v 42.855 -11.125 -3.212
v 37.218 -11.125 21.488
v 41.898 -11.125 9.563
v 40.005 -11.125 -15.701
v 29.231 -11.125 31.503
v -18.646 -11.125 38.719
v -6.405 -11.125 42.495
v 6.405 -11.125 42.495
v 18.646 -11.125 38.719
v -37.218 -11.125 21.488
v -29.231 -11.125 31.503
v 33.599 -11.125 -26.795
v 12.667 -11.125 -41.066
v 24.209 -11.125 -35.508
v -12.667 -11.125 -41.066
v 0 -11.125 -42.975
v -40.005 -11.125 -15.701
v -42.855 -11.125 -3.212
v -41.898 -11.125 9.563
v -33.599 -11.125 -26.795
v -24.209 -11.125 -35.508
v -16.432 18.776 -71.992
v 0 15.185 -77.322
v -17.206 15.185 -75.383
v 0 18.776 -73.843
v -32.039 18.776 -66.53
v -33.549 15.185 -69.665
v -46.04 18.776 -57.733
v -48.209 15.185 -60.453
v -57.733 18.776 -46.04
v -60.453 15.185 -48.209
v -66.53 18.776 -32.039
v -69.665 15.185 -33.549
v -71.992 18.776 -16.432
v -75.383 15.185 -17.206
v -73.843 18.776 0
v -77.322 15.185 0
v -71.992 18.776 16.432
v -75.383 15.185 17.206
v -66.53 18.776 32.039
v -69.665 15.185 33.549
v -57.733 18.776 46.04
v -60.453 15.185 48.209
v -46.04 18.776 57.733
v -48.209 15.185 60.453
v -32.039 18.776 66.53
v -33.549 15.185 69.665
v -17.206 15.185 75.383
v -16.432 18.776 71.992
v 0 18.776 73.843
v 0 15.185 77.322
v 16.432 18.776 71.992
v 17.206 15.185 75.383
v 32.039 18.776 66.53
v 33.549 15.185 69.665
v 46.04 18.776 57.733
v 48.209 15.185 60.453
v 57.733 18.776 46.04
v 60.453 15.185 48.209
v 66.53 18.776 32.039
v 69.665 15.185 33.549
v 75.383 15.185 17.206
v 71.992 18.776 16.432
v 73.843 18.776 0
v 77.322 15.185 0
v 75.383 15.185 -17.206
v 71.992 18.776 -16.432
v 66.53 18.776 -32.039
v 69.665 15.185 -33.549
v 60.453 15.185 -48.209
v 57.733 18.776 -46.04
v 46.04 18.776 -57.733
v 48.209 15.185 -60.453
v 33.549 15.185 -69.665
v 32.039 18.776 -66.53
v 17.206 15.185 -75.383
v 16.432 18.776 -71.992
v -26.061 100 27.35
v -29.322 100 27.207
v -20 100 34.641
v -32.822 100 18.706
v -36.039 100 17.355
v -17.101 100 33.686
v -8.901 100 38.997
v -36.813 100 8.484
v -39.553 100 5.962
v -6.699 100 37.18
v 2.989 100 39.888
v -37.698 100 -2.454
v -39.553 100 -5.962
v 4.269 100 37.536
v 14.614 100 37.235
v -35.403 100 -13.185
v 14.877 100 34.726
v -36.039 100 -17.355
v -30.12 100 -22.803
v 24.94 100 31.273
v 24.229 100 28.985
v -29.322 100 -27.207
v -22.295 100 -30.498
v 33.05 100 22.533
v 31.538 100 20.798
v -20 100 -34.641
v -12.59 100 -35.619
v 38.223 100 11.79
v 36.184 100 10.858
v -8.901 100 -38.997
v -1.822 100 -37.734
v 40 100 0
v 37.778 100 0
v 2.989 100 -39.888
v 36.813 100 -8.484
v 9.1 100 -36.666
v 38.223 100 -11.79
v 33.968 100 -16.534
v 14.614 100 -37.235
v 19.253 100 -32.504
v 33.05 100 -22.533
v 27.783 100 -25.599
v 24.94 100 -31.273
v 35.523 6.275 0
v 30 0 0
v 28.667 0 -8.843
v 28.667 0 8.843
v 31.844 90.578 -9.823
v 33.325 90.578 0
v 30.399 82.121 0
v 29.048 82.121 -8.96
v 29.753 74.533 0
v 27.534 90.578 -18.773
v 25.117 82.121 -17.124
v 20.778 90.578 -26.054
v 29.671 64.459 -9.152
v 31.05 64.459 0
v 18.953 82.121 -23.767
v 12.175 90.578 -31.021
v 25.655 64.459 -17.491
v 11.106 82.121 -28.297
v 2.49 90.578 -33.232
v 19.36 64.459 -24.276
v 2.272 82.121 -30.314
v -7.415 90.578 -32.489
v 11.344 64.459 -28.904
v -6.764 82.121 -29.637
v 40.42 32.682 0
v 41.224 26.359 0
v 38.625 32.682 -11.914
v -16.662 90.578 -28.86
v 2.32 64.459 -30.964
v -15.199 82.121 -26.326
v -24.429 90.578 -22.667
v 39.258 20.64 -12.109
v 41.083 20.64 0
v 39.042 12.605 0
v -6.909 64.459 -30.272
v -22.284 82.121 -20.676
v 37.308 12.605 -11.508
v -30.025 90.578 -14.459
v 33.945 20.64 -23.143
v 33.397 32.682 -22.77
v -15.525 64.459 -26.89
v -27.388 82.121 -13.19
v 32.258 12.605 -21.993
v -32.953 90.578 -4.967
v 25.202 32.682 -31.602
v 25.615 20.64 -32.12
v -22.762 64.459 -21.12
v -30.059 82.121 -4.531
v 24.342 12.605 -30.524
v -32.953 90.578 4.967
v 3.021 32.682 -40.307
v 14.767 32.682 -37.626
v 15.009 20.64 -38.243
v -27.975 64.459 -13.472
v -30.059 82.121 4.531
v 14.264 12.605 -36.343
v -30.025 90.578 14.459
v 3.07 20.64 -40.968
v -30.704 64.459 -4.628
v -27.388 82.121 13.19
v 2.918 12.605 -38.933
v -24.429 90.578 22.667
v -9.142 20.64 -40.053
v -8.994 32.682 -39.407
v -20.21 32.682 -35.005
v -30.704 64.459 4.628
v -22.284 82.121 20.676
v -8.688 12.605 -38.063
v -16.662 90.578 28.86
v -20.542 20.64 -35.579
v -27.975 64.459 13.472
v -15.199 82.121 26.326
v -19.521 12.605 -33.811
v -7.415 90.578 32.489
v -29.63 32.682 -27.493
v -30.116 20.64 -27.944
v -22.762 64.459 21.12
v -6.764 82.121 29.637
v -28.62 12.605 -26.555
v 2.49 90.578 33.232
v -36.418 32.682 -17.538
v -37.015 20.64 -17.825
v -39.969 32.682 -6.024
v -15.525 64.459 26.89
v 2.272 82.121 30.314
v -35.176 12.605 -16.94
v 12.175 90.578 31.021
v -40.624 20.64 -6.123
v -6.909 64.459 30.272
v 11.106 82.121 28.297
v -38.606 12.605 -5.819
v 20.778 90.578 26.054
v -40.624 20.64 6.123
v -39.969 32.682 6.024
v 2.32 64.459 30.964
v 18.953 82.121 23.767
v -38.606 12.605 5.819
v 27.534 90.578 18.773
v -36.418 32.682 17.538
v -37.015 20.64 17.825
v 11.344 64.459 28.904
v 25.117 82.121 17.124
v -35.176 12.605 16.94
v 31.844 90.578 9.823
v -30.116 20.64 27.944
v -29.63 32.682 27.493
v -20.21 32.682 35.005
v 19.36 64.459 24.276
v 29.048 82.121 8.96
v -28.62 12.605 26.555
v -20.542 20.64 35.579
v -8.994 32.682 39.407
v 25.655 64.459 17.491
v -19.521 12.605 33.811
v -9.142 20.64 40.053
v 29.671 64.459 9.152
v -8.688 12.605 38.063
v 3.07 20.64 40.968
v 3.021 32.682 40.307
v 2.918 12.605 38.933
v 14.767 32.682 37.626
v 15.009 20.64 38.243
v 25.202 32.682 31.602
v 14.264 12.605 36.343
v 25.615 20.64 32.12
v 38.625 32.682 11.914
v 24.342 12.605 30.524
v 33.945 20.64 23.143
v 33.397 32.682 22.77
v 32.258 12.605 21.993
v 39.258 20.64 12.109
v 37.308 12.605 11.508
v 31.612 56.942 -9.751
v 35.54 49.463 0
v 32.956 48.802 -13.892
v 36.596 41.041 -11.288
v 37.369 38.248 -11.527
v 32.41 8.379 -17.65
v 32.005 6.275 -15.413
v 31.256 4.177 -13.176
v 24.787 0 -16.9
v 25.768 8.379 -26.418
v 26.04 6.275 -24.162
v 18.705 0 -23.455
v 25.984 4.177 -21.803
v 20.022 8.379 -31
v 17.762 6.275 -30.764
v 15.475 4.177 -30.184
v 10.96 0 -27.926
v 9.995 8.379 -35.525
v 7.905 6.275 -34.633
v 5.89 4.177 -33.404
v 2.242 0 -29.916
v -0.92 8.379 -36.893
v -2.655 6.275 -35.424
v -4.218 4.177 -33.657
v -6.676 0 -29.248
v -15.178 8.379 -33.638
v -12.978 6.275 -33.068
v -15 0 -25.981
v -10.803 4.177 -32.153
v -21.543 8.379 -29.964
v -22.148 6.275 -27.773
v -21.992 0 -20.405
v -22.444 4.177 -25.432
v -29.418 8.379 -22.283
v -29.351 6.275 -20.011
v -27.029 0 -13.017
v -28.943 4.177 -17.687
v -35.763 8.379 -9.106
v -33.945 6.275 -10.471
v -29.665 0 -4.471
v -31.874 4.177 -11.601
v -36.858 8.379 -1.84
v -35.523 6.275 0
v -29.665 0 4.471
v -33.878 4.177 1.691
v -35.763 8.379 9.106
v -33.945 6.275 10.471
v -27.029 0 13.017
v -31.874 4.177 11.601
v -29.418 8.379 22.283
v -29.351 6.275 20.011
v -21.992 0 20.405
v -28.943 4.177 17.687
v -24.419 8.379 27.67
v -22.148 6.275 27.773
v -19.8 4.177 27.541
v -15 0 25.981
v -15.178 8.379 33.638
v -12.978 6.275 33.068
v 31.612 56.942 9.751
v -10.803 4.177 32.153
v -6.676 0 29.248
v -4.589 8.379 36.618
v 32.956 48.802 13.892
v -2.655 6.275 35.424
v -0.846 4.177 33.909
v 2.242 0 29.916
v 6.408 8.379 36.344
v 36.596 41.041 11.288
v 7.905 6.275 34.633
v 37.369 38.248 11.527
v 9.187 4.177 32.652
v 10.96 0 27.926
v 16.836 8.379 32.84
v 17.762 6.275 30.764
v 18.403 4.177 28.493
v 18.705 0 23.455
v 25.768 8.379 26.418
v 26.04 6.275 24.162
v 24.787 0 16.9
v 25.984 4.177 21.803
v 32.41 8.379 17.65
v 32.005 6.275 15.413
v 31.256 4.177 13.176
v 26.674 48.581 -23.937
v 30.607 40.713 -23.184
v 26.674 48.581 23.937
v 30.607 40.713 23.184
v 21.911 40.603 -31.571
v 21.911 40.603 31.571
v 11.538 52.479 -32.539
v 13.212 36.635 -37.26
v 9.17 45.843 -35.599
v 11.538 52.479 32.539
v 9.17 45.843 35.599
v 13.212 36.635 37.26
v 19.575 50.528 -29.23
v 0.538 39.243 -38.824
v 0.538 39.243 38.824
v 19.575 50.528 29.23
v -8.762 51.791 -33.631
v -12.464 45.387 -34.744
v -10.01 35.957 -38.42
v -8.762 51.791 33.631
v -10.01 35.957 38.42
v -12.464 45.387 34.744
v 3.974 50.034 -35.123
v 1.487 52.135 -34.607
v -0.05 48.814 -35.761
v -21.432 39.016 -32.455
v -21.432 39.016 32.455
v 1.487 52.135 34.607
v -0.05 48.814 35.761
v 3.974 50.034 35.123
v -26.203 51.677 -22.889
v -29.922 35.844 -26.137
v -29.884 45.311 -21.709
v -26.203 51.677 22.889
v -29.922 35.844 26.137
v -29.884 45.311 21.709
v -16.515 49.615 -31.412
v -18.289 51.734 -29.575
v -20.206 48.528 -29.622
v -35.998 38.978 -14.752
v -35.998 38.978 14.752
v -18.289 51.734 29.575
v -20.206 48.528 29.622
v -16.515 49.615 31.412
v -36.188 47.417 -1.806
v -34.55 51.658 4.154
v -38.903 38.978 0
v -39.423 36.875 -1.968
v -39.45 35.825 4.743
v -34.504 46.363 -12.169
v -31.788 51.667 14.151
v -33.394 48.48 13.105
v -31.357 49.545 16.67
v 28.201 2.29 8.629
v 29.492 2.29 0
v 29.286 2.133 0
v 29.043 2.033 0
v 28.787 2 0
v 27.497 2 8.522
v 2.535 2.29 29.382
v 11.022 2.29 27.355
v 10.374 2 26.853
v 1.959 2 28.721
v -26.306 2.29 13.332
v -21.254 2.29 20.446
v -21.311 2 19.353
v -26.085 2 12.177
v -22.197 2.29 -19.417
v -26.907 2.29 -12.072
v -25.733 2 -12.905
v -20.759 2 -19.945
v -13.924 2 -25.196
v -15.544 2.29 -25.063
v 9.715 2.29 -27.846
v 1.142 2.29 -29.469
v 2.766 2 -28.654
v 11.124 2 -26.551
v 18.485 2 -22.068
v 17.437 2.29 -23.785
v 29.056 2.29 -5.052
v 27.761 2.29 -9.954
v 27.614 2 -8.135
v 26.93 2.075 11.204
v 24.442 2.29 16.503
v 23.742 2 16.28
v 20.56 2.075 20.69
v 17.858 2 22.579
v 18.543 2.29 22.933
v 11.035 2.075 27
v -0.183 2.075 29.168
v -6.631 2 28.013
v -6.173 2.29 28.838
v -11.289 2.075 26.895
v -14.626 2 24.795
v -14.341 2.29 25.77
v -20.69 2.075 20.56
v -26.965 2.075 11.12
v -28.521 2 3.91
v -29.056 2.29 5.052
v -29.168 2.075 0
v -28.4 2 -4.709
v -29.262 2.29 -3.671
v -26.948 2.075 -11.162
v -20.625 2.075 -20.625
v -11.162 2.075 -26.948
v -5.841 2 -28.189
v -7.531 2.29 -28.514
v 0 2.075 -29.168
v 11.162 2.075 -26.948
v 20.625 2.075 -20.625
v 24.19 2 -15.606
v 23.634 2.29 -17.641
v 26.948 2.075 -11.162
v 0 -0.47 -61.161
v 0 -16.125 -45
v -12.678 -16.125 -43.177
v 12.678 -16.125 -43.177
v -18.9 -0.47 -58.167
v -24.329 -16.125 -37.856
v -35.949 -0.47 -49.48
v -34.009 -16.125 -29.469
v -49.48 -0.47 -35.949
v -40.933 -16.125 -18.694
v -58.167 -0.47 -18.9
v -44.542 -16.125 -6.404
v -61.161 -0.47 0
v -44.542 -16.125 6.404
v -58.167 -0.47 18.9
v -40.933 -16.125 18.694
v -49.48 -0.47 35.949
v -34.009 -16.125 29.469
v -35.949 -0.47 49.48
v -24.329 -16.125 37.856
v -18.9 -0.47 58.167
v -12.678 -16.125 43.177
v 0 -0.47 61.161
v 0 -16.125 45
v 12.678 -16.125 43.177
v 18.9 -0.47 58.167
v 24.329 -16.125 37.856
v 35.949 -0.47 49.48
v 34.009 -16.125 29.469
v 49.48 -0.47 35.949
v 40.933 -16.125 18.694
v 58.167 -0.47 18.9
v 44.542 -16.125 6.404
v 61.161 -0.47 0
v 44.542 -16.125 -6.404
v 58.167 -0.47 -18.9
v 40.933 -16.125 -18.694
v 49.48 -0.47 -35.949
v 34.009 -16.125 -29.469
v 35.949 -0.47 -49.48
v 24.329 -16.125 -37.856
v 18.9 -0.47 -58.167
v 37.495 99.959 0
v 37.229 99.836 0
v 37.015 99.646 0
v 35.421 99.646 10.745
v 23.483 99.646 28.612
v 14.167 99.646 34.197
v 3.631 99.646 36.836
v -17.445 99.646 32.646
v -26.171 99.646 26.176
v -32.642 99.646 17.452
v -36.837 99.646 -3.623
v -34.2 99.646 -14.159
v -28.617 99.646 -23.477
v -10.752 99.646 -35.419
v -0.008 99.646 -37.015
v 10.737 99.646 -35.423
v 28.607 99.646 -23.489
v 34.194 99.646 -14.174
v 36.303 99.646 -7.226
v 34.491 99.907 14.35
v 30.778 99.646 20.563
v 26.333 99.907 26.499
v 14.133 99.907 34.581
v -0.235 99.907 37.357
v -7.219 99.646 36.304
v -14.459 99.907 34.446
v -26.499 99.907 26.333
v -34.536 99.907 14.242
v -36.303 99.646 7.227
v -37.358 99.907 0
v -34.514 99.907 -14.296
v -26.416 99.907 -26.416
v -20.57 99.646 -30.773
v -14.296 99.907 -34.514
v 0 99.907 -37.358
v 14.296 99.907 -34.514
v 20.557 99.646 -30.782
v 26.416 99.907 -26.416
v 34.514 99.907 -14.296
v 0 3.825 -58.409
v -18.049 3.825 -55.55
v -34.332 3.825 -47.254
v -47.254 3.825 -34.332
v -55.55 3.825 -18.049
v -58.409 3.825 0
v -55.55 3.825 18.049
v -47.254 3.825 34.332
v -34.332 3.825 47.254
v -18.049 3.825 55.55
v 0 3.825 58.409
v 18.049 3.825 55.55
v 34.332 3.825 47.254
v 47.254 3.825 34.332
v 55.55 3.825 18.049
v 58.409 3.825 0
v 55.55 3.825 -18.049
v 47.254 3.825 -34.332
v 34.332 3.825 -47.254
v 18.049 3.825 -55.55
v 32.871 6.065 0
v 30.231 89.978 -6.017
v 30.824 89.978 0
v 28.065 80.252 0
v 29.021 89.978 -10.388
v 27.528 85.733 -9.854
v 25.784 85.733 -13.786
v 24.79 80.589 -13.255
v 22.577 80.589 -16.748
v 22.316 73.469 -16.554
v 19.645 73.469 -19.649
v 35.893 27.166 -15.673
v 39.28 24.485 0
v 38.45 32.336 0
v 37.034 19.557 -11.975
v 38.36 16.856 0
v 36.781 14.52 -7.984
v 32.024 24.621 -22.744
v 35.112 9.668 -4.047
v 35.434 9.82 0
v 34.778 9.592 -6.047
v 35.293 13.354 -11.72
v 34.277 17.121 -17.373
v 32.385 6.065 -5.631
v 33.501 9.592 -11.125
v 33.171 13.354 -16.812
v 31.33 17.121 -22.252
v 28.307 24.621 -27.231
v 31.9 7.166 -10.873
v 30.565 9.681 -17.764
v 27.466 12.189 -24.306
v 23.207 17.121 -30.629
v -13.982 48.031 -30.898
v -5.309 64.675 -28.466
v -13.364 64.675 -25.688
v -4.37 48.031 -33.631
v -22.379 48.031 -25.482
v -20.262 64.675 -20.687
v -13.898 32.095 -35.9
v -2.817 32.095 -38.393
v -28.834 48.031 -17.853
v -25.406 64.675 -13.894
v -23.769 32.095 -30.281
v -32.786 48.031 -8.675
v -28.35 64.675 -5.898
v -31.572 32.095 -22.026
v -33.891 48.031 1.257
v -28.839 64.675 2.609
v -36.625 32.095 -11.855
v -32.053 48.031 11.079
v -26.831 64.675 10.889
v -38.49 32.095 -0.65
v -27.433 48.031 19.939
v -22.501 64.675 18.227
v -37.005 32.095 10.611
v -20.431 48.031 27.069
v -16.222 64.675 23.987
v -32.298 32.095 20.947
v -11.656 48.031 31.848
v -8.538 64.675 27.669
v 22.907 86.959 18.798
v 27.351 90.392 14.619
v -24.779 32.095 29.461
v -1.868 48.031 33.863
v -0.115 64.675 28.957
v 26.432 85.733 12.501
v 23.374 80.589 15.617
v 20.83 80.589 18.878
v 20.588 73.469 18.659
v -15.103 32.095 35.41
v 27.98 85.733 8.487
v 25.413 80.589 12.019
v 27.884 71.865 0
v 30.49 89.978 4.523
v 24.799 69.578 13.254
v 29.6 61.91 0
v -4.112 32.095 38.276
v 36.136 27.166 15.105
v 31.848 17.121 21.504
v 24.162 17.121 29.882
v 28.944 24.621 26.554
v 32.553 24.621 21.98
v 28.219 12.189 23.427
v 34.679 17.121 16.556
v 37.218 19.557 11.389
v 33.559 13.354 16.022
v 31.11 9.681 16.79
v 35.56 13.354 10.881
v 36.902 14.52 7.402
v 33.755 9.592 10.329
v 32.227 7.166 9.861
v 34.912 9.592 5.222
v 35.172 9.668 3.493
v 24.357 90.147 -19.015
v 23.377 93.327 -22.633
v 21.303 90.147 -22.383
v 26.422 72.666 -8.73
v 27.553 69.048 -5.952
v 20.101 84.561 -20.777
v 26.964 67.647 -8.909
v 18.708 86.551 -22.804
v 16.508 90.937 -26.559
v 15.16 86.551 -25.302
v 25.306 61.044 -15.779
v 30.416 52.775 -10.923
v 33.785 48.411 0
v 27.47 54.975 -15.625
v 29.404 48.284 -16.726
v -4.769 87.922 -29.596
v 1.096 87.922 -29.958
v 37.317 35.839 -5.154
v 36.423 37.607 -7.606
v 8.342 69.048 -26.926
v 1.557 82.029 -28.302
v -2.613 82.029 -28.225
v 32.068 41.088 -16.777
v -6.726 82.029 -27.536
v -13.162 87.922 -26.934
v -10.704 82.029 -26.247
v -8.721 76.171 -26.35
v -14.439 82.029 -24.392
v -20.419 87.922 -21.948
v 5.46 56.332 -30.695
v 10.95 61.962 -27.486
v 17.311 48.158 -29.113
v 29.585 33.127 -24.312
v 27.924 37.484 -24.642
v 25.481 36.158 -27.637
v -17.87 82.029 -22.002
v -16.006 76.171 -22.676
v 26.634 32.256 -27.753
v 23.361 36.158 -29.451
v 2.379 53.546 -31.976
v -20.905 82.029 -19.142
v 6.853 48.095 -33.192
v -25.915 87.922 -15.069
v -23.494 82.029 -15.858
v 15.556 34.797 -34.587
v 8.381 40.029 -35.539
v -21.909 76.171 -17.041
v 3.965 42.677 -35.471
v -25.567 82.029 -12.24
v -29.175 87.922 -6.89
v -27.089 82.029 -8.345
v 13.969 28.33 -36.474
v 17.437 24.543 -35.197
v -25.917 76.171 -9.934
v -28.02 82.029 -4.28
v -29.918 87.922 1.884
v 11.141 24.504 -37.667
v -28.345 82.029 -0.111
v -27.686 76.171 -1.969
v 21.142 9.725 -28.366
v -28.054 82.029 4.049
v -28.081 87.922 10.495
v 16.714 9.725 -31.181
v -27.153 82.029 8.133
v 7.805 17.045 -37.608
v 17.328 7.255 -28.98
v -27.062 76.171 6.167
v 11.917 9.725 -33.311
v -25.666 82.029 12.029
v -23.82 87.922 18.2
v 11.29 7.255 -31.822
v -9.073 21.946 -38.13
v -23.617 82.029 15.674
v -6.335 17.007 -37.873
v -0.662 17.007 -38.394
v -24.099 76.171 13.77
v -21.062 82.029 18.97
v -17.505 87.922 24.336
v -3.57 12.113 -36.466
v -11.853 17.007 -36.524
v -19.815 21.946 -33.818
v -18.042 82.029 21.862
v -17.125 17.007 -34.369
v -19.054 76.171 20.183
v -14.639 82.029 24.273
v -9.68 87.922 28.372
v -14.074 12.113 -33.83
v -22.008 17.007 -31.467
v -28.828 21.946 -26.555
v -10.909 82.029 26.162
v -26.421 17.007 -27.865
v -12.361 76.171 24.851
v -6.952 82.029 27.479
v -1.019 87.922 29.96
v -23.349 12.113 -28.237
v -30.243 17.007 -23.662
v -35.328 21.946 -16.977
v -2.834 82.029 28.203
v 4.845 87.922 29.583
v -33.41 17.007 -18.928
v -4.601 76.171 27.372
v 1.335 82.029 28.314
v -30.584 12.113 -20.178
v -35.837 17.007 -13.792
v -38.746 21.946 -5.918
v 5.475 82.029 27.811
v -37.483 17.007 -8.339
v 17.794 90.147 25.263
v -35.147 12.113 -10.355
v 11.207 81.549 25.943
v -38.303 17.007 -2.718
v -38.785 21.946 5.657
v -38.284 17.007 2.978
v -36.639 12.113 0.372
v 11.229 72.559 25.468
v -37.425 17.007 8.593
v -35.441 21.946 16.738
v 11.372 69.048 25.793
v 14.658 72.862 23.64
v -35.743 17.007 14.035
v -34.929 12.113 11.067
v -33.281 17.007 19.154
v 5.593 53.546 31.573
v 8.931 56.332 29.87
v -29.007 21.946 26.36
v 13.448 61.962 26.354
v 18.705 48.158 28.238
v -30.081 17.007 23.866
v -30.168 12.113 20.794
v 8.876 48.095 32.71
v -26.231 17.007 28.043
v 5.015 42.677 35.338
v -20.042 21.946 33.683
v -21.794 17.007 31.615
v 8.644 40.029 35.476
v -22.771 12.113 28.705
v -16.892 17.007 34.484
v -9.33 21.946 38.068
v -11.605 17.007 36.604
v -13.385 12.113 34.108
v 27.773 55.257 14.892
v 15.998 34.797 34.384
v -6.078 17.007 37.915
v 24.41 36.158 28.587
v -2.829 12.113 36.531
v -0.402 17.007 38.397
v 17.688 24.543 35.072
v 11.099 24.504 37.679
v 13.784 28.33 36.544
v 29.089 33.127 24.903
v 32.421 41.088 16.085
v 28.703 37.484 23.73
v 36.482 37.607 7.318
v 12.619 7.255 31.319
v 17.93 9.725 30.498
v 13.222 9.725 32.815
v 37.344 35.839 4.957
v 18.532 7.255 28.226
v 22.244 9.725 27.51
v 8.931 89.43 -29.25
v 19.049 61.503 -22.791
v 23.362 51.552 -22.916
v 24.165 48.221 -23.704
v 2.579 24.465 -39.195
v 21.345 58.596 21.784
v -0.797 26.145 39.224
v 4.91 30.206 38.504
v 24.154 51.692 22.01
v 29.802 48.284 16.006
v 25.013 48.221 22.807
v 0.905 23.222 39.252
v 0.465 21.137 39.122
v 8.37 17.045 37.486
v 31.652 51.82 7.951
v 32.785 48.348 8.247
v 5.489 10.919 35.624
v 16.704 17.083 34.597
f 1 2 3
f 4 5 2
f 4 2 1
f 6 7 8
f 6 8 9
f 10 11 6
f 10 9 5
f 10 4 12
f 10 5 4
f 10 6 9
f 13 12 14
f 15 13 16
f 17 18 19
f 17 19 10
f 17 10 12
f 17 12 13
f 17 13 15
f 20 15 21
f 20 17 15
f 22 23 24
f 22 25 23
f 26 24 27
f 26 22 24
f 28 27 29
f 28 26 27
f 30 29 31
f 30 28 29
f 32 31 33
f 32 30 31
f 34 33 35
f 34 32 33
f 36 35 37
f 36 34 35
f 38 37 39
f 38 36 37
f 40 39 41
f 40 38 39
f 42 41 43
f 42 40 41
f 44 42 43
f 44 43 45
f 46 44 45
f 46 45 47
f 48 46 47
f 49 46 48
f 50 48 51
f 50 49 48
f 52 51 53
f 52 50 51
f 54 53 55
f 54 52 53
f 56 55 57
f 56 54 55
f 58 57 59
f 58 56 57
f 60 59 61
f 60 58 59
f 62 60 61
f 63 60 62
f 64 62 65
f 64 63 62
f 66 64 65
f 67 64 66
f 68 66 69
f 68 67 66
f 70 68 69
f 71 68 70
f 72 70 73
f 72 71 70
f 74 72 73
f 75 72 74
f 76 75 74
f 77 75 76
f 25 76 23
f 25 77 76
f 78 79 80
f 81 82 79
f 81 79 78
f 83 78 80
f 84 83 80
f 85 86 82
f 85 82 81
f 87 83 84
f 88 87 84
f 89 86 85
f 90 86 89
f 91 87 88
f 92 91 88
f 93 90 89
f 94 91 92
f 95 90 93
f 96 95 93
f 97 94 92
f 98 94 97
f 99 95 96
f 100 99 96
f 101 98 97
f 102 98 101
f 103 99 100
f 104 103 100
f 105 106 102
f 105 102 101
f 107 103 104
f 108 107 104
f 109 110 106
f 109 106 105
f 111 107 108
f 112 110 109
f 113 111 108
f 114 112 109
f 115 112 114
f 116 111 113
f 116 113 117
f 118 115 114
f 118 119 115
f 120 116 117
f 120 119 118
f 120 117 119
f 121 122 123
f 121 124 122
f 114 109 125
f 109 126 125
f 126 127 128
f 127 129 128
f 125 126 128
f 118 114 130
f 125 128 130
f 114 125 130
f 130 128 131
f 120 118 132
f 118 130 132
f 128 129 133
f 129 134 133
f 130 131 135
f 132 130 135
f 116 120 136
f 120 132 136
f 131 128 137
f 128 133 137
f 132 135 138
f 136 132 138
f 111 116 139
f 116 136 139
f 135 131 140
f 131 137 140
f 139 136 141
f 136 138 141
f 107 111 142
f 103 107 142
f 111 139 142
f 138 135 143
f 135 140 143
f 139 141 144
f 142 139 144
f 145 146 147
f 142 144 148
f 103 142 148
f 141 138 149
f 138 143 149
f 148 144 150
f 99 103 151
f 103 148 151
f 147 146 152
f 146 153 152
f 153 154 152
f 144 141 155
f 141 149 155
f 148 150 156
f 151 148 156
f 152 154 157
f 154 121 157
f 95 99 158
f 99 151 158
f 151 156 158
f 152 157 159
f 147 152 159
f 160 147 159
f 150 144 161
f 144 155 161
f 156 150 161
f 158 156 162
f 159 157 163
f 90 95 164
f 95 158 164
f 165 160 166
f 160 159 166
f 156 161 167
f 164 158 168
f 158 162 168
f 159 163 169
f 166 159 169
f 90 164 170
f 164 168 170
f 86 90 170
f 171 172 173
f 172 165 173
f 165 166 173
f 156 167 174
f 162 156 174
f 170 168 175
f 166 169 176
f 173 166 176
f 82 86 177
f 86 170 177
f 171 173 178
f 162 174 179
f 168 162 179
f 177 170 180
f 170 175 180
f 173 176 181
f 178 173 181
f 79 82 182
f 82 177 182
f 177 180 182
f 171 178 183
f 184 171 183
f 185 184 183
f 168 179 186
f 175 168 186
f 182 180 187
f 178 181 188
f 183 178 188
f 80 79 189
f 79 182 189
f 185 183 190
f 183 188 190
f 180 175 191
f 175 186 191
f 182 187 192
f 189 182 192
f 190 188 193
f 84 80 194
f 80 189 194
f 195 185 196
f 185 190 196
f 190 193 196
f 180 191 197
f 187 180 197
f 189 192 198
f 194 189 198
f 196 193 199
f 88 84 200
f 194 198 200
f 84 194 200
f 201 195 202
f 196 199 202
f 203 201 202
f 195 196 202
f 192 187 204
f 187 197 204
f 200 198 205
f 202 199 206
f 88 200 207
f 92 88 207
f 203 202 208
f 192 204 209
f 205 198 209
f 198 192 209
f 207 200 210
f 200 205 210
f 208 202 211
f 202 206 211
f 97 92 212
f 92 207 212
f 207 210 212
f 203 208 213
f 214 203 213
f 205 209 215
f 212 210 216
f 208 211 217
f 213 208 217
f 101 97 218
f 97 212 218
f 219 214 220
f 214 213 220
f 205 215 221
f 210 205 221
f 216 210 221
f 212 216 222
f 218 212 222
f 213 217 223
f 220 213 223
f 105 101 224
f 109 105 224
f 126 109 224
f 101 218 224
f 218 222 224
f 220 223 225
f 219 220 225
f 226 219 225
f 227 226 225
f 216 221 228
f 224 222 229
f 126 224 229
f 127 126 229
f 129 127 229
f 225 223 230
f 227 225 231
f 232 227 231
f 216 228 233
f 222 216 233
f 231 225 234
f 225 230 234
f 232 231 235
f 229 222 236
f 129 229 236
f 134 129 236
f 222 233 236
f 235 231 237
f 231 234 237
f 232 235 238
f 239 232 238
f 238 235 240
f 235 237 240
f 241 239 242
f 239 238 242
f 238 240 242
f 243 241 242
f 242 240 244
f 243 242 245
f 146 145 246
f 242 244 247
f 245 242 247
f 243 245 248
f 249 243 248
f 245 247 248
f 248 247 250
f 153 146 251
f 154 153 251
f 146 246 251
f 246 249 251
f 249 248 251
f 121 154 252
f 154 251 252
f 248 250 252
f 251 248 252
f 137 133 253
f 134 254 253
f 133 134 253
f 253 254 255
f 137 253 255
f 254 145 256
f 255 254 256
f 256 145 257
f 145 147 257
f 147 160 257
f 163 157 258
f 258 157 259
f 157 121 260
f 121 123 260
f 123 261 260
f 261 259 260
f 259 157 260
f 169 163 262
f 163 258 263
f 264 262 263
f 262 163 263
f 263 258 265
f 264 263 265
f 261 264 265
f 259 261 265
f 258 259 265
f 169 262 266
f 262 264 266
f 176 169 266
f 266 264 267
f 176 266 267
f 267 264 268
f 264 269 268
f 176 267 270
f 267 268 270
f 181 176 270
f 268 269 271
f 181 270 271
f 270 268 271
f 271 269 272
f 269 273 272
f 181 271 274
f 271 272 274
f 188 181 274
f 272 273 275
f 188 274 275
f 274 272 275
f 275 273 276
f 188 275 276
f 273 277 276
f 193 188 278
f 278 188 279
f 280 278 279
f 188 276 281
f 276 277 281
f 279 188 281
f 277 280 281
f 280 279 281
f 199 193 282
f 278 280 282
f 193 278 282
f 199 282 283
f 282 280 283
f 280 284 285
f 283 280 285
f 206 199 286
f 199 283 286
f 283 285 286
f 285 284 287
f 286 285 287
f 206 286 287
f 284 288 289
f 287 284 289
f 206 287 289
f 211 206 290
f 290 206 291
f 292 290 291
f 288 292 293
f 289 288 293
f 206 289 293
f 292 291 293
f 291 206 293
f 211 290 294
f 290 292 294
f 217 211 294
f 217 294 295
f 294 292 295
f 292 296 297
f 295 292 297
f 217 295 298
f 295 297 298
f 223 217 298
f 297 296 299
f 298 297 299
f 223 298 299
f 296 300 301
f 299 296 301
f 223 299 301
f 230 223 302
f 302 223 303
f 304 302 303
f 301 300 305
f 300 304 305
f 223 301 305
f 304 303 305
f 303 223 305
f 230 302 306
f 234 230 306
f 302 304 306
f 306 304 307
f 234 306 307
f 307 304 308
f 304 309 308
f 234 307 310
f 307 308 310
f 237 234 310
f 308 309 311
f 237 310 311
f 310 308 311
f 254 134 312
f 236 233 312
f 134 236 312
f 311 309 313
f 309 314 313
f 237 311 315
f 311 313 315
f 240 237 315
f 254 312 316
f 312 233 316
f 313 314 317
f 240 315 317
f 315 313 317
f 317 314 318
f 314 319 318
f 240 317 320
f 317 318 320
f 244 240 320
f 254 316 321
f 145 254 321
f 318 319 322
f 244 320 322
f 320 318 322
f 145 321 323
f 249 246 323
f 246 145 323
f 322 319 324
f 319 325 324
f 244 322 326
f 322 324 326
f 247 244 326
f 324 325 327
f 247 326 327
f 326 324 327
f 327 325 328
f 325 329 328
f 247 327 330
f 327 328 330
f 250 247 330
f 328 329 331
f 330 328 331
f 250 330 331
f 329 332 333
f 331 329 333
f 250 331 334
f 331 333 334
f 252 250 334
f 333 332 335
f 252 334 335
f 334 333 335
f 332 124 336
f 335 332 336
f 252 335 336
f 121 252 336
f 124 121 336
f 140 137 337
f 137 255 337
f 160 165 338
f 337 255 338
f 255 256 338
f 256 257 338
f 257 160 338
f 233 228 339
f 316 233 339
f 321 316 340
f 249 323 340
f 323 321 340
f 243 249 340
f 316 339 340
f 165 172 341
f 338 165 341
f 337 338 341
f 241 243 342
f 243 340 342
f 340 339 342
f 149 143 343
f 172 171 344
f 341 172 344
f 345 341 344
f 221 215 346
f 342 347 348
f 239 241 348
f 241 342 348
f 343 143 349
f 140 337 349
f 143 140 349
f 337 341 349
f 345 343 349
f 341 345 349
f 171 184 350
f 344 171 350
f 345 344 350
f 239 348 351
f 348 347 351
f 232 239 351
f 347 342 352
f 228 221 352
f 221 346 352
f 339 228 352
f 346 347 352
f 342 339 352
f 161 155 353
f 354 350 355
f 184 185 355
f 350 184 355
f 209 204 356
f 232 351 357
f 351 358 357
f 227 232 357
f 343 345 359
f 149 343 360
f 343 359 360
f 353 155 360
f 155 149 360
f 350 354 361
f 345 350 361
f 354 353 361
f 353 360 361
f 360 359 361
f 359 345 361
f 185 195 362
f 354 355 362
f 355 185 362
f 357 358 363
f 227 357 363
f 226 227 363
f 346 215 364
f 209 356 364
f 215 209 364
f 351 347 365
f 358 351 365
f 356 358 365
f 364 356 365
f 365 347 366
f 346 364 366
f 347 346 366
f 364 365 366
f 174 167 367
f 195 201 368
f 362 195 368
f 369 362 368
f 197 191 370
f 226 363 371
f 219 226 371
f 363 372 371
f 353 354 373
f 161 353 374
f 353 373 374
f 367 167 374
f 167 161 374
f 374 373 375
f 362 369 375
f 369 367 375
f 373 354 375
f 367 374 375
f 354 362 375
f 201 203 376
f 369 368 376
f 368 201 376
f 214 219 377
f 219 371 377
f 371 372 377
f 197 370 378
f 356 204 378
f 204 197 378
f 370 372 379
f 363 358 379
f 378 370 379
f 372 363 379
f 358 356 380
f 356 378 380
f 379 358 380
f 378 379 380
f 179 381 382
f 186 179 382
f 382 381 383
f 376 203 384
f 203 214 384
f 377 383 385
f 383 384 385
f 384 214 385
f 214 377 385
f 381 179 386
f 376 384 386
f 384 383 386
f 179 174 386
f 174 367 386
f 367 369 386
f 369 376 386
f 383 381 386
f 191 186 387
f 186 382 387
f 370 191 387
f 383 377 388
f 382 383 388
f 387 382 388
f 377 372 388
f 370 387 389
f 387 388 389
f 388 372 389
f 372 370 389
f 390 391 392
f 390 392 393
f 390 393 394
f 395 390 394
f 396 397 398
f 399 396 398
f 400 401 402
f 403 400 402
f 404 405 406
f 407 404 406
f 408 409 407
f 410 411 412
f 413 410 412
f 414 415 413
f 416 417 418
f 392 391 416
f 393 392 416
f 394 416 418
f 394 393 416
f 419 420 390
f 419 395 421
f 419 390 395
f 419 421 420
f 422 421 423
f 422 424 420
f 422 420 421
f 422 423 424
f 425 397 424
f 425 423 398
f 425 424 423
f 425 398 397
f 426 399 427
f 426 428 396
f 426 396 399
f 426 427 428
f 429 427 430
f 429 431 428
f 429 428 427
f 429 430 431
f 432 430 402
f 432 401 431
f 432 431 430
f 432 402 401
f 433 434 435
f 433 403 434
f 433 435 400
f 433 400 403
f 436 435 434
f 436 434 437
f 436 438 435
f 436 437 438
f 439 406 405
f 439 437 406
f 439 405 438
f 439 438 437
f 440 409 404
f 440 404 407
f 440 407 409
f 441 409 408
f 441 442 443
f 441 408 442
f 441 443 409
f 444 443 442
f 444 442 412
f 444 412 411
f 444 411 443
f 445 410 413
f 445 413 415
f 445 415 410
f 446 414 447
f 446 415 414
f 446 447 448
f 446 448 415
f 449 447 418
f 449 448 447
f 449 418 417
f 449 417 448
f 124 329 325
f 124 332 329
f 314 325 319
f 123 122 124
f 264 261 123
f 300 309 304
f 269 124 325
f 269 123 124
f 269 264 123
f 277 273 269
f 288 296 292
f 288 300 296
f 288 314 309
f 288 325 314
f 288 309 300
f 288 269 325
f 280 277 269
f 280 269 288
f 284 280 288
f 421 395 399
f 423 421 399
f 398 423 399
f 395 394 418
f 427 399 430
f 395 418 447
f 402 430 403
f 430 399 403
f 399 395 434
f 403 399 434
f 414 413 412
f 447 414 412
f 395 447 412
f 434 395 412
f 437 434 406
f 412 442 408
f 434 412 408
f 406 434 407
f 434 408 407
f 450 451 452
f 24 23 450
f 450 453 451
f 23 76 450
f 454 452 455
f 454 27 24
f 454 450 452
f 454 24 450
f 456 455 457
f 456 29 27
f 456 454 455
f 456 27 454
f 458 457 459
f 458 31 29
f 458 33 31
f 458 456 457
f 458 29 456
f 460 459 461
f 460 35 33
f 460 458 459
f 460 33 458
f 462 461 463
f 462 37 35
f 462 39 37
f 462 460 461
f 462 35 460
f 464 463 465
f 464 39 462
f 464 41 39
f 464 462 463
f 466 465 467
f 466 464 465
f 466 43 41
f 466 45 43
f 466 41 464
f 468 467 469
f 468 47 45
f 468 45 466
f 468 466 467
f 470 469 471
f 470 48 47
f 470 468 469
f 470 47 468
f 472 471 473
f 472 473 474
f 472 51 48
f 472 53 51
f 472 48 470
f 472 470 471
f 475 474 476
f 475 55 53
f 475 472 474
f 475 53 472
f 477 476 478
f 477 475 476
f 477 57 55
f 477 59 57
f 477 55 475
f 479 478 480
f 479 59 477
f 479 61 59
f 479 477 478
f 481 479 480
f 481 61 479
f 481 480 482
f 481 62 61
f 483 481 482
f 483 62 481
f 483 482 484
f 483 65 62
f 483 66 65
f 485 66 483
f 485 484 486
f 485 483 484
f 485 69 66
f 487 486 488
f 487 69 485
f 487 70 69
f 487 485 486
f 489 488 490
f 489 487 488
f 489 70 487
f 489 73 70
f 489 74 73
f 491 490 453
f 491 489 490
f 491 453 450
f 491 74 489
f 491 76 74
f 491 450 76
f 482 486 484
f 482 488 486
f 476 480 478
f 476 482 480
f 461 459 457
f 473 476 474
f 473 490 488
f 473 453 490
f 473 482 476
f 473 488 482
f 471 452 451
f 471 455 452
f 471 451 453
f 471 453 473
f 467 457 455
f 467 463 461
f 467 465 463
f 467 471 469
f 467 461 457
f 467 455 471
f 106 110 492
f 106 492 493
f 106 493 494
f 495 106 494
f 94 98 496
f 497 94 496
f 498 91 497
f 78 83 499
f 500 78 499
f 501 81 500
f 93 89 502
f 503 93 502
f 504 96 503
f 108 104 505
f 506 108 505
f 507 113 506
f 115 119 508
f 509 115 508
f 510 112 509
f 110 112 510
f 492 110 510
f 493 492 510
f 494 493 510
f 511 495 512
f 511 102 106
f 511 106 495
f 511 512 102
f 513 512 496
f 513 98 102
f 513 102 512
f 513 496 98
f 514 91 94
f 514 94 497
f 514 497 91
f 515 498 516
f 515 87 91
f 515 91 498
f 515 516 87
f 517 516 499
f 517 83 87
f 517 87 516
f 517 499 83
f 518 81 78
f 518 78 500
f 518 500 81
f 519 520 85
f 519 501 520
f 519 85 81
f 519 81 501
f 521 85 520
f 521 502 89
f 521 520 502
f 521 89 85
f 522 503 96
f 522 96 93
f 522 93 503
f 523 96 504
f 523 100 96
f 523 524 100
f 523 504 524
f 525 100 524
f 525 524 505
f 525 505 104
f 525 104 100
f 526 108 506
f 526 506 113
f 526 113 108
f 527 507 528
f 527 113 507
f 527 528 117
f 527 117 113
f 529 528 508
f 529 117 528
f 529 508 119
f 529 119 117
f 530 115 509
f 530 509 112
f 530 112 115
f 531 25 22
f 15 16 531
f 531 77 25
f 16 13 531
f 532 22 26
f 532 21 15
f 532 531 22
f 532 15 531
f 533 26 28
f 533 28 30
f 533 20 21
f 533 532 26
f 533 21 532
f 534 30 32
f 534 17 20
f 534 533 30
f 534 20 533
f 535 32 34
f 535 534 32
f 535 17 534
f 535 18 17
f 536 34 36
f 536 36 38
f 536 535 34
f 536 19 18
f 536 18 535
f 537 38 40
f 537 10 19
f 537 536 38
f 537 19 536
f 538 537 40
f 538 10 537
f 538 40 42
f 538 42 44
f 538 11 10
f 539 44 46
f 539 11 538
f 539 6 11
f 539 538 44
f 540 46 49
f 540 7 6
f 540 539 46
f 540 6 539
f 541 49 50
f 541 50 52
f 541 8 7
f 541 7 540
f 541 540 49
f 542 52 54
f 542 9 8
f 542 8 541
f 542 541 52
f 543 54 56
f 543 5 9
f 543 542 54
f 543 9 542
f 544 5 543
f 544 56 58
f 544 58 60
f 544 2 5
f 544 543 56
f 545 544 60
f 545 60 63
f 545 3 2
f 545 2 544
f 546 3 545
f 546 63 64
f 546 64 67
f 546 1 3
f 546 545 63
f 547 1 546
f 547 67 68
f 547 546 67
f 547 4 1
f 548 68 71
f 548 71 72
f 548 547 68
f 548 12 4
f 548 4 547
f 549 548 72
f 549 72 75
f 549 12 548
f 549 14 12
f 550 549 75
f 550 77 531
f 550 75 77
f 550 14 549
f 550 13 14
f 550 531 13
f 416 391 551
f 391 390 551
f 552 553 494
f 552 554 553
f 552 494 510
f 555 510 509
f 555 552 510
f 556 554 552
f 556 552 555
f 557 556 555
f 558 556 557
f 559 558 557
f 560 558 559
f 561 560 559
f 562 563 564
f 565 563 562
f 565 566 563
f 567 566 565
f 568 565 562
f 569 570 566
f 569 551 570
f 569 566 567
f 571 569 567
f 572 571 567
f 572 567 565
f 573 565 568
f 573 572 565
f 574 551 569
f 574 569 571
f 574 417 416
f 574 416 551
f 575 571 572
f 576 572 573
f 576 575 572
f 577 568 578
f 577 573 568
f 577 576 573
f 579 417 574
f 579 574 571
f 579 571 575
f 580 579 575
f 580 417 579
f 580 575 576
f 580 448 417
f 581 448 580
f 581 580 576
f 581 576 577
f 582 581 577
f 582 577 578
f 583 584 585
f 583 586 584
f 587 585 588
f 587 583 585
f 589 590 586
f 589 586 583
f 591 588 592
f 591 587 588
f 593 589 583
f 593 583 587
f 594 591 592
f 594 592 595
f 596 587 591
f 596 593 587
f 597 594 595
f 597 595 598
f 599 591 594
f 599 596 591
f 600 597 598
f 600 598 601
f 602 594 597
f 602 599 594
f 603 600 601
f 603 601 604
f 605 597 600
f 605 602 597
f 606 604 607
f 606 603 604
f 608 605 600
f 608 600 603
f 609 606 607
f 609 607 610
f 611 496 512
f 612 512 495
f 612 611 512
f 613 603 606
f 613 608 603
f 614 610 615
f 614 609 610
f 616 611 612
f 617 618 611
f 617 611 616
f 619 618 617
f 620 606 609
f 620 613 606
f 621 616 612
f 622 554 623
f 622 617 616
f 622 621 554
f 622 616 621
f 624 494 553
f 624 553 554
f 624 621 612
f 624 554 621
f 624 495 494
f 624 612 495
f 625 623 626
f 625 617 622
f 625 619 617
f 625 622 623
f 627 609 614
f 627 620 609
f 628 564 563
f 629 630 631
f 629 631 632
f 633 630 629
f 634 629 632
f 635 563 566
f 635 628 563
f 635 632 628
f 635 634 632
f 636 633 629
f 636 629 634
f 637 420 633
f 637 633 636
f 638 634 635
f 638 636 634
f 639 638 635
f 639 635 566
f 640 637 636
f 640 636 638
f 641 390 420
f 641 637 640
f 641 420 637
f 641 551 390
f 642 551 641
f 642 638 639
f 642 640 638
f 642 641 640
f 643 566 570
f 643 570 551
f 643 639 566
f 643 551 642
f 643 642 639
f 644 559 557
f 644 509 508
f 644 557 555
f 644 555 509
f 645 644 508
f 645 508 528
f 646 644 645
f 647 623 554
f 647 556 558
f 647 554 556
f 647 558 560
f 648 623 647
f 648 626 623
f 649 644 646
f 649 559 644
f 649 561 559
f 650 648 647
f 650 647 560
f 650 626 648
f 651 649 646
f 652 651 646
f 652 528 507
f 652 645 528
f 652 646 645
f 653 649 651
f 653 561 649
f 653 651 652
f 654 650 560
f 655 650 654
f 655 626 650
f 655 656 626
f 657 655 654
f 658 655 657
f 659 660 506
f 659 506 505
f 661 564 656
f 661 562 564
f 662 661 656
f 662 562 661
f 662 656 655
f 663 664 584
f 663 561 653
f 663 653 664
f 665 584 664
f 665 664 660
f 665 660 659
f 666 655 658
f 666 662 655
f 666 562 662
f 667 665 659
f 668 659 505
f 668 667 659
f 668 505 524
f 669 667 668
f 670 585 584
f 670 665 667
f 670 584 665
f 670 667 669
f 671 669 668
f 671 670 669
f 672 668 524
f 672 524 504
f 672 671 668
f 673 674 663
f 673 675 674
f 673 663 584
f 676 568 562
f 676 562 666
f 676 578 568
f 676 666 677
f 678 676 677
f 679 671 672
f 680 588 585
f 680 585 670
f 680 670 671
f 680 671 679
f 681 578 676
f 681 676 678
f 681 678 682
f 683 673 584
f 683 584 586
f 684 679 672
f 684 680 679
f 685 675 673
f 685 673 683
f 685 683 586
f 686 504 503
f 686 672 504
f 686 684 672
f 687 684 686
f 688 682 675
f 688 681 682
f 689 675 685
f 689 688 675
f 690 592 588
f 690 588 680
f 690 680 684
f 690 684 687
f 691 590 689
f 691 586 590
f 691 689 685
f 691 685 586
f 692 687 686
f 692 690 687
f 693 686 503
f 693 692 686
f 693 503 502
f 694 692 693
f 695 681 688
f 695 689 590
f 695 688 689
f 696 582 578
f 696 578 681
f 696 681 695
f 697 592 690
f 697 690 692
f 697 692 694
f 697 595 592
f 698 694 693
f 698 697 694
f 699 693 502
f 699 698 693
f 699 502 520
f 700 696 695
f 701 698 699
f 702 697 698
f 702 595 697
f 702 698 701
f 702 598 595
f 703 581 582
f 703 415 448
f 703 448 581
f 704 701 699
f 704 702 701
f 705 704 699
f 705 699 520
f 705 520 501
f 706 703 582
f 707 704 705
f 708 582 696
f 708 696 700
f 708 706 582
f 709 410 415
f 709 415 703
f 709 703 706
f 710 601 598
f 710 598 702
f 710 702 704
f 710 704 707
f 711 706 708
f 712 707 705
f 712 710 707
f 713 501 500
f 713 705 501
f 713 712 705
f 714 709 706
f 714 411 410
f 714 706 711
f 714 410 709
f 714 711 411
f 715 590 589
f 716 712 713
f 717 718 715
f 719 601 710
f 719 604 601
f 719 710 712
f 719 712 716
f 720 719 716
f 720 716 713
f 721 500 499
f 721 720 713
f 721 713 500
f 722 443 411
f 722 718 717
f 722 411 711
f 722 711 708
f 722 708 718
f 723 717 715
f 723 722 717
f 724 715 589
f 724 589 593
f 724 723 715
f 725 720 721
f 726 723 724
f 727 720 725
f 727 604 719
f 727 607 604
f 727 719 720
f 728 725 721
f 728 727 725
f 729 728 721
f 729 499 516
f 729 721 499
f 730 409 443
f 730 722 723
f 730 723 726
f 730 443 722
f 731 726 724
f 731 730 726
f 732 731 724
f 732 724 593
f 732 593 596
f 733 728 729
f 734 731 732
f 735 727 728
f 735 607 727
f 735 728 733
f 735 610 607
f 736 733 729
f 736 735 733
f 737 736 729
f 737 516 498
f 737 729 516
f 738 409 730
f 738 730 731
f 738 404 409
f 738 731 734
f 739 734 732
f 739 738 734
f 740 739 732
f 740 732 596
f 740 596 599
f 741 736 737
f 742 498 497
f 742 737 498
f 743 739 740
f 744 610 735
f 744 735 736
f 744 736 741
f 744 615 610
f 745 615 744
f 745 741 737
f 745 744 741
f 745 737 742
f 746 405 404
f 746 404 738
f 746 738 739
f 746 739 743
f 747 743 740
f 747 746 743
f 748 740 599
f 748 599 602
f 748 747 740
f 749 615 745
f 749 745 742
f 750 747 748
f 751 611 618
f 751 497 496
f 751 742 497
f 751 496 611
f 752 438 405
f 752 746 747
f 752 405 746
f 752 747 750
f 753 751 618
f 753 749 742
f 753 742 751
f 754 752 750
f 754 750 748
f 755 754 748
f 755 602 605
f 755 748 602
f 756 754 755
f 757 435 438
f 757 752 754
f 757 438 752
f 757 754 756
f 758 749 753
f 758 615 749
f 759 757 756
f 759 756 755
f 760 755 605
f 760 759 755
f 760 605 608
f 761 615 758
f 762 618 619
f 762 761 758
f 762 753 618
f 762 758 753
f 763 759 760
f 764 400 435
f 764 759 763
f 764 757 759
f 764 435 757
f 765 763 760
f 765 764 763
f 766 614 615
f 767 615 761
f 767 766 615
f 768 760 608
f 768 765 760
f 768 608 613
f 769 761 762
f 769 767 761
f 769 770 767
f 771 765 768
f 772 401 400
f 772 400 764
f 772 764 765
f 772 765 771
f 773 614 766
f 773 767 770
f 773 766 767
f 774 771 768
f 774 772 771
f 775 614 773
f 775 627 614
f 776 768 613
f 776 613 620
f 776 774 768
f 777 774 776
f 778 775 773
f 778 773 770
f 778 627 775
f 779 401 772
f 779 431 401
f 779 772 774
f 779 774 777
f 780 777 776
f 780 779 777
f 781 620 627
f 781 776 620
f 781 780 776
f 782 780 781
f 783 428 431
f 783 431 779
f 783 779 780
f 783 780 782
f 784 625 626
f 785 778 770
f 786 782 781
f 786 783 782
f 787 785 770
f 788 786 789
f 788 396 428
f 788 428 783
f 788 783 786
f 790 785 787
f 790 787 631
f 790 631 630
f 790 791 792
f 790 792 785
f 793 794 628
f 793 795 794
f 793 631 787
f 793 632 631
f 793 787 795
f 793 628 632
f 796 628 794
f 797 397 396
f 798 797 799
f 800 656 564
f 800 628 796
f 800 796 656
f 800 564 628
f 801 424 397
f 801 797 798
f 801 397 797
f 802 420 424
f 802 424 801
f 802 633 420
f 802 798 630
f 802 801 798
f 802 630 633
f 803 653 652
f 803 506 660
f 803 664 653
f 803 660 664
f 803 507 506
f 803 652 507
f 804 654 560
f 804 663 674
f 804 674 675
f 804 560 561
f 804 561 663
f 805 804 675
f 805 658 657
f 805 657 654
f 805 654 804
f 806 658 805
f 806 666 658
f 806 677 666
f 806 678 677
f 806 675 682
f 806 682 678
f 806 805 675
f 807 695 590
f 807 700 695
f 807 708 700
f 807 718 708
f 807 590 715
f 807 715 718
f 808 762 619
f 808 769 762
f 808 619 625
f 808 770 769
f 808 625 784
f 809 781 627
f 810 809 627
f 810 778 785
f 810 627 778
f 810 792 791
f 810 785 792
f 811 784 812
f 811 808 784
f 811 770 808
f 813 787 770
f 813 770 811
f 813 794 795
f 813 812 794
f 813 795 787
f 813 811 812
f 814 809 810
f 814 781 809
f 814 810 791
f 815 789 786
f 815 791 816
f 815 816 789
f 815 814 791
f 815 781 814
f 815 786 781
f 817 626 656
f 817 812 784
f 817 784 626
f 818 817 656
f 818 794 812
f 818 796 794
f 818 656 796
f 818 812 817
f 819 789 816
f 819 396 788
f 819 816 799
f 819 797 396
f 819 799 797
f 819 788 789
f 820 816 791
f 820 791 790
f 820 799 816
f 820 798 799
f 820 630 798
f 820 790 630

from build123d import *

# Parameters (mm, degrees)
SHELL26_T = -2
FILLET1_R = 1


with BuildPart() as part:
    # Sketch1 → Revolve2 (revolve)
    with BuildSketch(Plane.XY):
        with BuildLine():
            Line((40, 100), (0, 100))
            Line((0, 100), (0, 0))
            Line((0, 0), (30, 0))
            add(Edge.make_bspline(
                [(40, 100), (8.214298289, 65.676365866), (63.629973381, 31.703163026), (30, 0)],
                knots=[0, 0, 0, 0, 1, 1, 1, 1], degree=3))
        make_face()
    revolve(axis=Axis((0, 0, 0), (0, 1, 0)))

    # Shell26
    shell26_openings = [part.faces().sort_by_distance(p)[0] for p in [
        (0, 100, 0),
    ]]
    offset(amount=SHELL26_T, openings=shell26_openings, kind=Kind.INTERSECTION)

    # Fillet1
    fillet1_edges = [part.edges().sort_by_distance(p)[0] for p in [
        (-37.317425183, 100, 0),
        (-29.196581379, 2, 0),
    ]]
    fillet(fillet1_edges, radius=FILLET1_R)


with BuildPart() as body_2:
    # Sketch7 → Revolve-Thin2 (revolve)
    with BuildSketch(Plane.XY, mode=Mode.PRIVATE) as revolve_thin2_sk:
        Polygon((0, -16.125168338), (-45, -16.125168338), (-77.321781883, 15.184613135), (-73.842917275, 18.775922233), (-42.975358255, -11.125168338), (0, -11.125168338), align=None)
    revolve(revolve_thin2_sk.sketch.rotate(Axis((0, -16.125168338, 0), (0, 1, 0)), 270), axis=Axis((0, -16.125168338, 0), (0, 1, 0)))


solid = Compound([part.part, body_2.part])
